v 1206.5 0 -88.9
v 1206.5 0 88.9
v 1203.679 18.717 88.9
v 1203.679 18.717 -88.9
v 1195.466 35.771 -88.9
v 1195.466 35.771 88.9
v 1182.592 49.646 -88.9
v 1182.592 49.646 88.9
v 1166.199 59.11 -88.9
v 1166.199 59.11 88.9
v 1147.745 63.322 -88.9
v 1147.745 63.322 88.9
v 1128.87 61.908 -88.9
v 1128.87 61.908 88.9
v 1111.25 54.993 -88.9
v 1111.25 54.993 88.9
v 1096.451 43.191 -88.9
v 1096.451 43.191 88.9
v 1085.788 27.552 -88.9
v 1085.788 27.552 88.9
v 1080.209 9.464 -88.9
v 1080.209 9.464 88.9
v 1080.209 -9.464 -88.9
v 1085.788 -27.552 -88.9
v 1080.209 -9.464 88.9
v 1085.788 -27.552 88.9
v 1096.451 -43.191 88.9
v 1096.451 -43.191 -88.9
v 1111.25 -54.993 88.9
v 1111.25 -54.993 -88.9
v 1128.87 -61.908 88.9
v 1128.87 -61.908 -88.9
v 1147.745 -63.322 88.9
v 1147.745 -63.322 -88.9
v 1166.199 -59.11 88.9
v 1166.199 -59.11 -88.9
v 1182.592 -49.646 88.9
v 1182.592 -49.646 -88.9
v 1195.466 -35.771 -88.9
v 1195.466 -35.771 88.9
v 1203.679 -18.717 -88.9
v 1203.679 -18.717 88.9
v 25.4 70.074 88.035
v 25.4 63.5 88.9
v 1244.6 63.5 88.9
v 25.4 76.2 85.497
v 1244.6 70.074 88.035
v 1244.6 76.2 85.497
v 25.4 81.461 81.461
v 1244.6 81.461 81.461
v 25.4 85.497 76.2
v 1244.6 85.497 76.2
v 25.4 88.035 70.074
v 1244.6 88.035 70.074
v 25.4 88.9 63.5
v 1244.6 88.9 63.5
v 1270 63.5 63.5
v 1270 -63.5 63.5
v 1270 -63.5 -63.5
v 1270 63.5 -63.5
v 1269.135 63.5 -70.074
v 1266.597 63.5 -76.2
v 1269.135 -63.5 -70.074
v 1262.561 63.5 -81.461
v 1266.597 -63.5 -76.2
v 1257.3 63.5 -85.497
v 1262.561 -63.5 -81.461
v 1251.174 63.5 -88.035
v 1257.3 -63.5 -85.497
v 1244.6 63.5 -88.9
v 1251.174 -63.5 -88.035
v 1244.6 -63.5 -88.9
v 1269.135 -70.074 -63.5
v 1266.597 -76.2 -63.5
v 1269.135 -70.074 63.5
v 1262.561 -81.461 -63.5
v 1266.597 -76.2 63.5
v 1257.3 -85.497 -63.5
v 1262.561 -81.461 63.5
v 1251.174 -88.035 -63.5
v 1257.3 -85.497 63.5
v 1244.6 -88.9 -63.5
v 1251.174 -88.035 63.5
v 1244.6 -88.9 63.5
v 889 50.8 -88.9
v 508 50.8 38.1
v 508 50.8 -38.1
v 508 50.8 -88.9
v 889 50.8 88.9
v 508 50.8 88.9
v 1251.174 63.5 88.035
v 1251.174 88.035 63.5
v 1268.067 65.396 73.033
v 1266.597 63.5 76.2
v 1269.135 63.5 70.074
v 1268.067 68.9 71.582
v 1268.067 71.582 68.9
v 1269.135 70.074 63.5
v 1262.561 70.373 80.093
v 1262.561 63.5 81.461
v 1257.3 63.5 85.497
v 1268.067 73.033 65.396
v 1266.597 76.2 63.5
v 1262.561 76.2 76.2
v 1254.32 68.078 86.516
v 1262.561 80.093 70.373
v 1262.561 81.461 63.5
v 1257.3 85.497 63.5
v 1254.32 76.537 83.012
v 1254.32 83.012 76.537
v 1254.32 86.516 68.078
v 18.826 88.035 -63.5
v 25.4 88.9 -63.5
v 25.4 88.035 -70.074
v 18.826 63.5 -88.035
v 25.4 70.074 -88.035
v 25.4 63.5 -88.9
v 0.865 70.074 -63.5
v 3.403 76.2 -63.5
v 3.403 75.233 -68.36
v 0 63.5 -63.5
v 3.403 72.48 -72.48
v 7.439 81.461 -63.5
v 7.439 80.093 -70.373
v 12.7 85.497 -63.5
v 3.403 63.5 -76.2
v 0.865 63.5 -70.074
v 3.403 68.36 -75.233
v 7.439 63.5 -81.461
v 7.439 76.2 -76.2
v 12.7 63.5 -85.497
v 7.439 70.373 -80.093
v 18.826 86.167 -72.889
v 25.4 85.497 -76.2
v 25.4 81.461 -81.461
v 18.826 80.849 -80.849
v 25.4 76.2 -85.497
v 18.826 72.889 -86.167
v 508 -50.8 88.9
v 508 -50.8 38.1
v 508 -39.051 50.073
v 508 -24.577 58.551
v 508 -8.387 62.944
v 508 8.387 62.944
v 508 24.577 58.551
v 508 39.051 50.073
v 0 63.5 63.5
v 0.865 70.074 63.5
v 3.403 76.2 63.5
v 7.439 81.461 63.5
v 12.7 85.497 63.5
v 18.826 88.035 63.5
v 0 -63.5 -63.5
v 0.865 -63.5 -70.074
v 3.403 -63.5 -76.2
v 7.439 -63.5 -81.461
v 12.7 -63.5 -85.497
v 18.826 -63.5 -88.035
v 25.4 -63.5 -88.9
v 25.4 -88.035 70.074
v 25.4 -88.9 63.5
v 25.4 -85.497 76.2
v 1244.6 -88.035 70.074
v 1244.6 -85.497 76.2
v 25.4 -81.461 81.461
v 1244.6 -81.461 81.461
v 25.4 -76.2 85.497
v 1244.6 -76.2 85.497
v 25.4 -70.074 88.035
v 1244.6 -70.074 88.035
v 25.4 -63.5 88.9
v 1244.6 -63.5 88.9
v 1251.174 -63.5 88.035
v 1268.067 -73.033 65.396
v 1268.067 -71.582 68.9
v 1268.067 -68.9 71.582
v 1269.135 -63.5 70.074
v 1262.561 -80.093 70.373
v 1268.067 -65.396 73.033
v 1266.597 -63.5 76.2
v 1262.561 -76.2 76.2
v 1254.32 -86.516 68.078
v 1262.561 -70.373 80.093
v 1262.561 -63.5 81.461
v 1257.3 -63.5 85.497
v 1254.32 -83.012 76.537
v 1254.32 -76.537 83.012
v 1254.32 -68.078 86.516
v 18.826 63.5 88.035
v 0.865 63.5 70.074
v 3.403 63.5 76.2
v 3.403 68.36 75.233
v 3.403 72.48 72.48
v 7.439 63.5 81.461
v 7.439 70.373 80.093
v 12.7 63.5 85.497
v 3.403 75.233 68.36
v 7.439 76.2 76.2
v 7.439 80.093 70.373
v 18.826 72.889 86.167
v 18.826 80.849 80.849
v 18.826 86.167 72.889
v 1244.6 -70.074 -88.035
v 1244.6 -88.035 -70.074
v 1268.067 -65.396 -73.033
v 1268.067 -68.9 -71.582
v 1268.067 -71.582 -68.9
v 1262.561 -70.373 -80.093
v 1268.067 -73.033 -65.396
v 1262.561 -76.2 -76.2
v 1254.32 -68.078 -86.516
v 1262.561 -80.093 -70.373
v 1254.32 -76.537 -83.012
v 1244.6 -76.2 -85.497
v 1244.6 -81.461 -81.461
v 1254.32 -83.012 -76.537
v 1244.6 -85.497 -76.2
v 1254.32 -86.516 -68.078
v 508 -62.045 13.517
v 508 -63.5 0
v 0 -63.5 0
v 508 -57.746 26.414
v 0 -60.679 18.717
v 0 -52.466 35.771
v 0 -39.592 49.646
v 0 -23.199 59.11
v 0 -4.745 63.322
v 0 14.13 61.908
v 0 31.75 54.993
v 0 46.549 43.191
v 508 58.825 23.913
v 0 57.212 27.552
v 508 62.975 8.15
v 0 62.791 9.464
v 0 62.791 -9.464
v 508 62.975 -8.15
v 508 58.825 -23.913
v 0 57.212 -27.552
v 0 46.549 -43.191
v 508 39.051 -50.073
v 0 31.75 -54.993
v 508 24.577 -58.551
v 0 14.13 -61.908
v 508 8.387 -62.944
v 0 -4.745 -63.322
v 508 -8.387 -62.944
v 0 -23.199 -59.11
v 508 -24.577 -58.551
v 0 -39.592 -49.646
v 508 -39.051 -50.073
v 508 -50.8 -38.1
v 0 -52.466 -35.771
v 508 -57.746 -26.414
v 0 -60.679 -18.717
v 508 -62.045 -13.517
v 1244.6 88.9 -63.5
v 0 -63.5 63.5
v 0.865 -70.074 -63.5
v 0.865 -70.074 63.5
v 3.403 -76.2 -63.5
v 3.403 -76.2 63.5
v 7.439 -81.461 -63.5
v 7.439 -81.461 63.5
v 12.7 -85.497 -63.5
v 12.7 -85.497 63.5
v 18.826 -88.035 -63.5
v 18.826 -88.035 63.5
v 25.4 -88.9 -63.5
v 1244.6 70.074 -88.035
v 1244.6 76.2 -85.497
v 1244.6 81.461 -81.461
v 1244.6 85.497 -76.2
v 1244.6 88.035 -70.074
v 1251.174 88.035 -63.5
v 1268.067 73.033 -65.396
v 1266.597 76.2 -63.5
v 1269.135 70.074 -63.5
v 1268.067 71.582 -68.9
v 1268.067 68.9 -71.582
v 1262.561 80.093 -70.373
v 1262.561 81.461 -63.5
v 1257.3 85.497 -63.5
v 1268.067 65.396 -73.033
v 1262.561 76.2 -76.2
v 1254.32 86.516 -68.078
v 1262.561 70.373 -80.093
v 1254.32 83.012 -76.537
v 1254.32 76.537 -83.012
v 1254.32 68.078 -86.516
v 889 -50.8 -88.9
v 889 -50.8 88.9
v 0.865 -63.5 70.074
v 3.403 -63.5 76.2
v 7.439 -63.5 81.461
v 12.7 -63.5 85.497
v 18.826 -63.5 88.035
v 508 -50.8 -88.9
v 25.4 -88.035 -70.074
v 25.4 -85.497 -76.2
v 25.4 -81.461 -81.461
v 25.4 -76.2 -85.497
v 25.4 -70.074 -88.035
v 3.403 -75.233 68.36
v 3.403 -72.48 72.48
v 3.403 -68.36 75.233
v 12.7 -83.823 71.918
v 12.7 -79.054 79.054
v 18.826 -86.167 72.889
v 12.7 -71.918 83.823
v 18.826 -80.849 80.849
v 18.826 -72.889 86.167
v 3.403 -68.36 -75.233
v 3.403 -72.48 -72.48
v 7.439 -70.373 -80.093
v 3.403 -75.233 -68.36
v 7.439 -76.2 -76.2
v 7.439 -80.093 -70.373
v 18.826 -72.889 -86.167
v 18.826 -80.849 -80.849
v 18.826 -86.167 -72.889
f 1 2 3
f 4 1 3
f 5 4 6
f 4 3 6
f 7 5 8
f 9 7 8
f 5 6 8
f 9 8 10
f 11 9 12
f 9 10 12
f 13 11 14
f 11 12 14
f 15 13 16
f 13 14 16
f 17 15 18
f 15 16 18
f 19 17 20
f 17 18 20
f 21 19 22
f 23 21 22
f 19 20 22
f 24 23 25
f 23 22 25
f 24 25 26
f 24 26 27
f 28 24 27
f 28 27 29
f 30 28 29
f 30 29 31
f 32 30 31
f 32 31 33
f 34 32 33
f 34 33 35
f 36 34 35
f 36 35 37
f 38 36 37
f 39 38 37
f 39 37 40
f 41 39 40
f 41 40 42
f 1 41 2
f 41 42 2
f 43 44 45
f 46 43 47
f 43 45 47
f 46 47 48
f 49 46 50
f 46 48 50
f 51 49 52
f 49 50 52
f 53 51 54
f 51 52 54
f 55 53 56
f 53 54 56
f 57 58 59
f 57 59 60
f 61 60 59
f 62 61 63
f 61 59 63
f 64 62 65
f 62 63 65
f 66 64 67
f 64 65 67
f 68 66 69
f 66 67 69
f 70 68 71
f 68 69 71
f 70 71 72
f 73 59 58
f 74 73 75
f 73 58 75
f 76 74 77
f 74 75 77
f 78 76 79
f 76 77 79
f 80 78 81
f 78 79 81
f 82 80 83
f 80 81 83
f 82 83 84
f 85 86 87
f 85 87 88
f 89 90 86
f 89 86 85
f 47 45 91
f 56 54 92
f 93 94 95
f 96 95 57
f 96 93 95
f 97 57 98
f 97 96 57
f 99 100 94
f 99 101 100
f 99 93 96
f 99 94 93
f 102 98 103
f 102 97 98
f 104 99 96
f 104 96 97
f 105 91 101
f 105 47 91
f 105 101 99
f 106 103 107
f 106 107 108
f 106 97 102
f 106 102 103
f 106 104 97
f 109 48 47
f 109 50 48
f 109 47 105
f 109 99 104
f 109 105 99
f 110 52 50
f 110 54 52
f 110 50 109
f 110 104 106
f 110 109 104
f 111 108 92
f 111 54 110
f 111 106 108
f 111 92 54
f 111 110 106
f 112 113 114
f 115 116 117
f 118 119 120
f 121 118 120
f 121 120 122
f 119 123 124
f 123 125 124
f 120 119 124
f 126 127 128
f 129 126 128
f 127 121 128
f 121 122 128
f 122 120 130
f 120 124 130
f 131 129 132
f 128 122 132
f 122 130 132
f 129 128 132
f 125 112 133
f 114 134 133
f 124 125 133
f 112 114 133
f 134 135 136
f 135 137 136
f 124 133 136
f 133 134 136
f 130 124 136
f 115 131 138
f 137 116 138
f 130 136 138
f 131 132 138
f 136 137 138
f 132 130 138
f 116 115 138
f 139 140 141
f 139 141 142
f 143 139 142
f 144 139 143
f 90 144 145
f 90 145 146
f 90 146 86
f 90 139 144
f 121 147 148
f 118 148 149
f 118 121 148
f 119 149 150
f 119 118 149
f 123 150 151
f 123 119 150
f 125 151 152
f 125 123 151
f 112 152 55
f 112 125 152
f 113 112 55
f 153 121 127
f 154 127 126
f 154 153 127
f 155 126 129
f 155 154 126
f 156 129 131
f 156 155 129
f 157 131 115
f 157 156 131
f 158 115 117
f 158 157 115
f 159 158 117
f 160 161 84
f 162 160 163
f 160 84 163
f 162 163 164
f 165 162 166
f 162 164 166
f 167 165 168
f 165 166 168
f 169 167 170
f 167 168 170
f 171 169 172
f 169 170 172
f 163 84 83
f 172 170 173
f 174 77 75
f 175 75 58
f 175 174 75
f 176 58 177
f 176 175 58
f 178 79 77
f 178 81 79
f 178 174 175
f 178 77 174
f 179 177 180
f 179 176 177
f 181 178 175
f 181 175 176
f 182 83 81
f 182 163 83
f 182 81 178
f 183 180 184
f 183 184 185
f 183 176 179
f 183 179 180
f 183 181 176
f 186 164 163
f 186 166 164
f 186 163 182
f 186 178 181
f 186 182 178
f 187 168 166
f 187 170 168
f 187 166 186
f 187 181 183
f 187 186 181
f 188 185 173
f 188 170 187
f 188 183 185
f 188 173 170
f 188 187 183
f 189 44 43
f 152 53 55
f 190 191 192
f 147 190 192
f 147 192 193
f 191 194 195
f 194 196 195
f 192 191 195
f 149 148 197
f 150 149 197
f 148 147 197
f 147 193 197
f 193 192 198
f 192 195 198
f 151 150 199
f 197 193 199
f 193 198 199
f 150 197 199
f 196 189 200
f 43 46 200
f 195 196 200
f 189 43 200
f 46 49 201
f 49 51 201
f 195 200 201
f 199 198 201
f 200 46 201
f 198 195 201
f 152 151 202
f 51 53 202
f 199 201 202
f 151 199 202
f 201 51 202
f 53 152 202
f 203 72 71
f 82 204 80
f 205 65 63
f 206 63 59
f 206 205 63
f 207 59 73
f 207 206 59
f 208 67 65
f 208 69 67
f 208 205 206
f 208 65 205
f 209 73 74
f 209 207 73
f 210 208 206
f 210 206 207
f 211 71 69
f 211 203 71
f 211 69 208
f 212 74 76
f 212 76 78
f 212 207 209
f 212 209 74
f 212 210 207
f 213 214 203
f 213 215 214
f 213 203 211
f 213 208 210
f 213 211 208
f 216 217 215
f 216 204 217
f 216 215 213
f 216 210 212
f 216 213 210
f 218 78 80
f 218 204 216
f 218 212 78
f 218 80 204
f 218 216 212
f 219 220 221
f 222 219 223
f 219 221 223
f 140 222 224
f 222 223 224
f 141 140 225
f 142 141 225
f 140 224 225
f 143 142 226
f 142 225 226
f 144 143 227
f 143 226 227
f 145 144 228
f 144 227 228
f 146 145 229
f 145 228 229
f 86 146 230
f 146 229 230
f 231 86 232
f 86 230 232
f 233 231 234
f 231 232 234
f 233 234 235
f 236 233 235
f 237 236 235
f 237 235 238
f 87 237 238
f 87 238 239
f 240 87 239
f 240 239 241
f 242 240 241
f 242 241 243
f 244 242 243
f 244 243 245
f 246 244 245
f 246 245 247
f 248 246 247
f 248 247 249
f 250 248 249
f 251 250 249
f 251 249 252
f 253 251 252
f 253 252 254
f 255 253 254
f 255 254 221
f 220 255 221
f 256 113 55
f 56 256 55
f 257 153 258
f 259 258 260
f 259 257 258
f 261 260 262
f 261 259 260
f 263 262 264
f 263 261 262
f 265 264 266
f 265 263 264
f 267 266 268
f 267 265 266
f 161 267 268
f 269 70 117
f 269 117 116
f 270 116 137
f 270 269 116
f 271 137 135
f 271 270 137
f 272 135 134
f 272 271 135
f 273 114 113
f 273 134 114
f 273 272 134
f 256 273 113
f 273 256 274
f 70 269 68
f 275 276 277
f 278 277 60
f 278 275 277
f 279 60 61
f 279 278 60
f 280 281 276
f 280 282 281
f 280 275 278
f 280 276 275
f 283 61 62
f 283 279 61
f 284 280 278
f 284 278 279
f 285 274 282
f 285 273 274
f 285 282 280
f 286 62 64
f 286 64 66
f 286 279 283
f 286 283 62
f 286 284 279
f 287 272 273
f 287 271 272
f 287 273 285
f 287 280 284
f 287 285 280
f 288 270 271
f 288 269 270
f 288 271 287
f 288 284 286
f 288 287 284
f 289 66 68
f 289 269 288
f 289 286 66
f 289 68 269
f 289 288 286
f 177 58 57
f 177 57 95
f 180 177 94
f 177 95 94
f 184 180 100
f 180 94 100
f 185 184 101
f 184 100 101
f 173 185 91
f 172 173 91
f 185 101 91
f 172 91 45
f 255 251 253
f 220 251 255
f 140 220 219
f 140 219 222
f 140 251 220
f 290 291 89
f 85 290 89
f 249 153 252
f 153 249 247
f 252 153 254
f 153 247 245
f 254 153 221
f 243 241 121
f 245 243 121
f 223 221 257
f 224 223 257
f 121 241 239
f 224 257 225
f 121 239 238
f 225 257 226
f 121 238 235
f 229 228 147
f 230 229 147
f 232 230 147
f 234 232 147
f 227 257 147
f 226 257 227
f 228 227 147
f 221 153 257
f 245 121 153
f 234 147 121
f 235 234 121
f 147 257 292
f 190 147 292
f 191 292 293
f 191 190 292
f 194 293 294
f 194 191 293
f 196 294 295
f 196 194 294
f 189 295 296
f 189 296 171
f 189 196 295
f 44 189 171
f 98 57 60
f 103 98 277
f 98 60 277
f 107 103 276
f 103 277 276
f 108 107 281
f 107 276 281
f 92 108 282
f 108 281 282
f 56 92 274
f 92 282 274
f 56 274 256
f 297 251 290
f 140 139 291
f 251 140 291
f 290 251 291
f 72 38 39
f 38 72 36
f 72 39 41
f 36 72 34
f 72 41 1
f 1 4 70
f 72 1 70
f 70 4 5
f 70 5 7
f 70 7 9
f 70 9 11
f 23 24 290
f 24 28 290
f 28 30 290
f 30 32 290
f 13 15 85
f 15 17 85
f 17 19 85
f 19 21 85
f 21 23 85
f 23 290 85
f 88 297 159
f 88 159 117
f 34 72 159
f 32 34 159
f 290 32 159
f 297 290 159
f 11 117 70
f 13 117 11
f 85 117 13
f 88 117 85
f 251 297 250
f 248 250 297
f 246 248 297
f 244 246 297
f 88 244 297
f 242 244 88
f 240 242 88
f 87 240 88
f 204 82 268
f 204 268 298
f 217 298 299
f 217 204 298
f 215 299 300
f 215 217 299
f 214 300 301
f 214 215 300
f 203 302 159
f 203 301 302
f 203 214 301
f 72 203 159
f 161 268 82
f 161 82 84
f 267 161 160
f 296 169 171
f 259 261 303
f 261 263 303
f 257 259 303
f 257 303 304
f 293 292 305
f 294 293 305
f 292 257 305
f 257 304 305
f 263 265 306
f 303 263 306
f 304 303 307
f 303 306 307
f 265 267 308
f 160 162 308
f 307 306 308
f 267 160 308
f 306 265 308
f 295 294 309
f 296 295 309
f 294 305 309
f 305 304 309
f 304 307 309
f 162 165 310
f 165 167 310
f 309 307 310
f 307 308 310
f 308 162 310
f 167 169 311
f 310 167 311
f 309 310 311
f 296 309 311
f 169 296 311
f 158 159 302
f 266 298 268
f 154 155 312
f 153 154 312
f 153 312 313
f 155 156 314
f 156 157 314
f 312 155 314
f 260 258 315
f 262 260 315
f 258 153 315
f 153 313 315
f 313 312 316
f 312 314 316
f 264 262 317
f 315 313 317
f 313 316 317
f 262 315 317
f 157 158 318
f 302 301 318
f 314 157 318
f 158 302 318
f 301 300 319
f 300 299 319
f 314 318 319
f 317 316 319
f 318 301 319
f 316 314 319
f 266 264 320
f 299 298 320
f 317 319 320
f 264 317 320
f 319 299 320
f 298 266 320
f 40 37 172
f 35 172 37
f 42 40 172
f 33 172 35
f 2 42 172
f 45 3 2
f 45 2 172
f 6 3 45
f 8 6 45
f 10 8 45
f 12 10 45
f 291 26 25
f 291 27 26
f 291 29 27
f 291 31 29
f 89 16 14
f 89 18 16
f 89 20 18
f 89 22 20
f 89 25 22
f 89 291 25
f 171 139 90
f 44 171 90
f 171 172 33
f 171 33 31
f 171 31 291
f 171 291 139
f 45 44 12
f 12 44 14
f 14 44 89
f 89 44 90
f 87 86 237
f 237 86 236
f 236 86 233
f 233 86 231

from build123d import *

# Parameters (mm, degrees)
F0_W     = 177.8
F0_H     = 177.8
F1_DEPTH = 1270
F2_R     = 63.5
F3_DEPTH = 177.8
F4_R     = 63.5
F5_DEPTH = 508
F6_R     = 25.4
F7_R     = 25.4
F8_W     = 381
F8_H     = 101.6
F9_DEPTH = 177.8
F10_R    = 25.39999


# Not quite as in the source:
# - a fillet or chamfer is up to 0.001 mm smaller than in the source, because OpenCascade refuses the exact size


with BuildPart() as f1:
    # F0 (on Right) → F1 (new body)
    with BuildSketch(Plane.YZ):
        Rectangle(F0_W, F0_H)
    extrude(amount=F1_DEPTH)

    # F2 (on face) → F3 (cut)
    with BuildSketch(Plane.XY.offset(88.9)):
        with Locations((1143, 0)):
            Circle(F2_R)
    extrude(amount=-F3_DEPTH, mode=Mode.SUBTRACT)

    # F4 (on face) → F5 (cut)
    with BuildSketch(Plane(origin=(0, 0, 0), x_dir=(0, -1, 0), z_dir=(-1, 0, 0))):
        Circle(F4_R)
    extrude(amount=-F5_DEPTH, mode=Mode.SUBTRACT)

    # F6
    f6_edges = [f1.edges().sort_by_distance(p)[0] for p in [
        (635, -88.9, 88.9),
        (635, 88.9, 88.9),
        (635, -88.9, -88.9),
        (635, 88.9, -88.9),
    ]]
    fillet(f6_edges, radius=F6_R)

    # F7
    f7_edges = [f1.edges().sort_by_distance(p)[0] for p in [
        (1270, 0, 88.9),
    ]]
    fillet(f7_edges, radius=F7_R)

    # F8 (on face) → F9 (cut)
    with BuildSketch(Plane.XY.offset(88.9)):
        with Locations((698.5, 0)):
            Rectangle(F8_W, F8_H)
    extrude(amount=-F9_DEPTH, mode=Mode.SUBTRACT)

    # F10 (radius 25.4 in the source; OpenCascade refuses exactly that, so slightly less here)
    f10_edges = [f1.edges().sort_by_distance(p)[0] for p in [
        (0, 0, 88.9),
    ]]
    fillet(f10_edges, radius=F10_R)


solid = f1.part
